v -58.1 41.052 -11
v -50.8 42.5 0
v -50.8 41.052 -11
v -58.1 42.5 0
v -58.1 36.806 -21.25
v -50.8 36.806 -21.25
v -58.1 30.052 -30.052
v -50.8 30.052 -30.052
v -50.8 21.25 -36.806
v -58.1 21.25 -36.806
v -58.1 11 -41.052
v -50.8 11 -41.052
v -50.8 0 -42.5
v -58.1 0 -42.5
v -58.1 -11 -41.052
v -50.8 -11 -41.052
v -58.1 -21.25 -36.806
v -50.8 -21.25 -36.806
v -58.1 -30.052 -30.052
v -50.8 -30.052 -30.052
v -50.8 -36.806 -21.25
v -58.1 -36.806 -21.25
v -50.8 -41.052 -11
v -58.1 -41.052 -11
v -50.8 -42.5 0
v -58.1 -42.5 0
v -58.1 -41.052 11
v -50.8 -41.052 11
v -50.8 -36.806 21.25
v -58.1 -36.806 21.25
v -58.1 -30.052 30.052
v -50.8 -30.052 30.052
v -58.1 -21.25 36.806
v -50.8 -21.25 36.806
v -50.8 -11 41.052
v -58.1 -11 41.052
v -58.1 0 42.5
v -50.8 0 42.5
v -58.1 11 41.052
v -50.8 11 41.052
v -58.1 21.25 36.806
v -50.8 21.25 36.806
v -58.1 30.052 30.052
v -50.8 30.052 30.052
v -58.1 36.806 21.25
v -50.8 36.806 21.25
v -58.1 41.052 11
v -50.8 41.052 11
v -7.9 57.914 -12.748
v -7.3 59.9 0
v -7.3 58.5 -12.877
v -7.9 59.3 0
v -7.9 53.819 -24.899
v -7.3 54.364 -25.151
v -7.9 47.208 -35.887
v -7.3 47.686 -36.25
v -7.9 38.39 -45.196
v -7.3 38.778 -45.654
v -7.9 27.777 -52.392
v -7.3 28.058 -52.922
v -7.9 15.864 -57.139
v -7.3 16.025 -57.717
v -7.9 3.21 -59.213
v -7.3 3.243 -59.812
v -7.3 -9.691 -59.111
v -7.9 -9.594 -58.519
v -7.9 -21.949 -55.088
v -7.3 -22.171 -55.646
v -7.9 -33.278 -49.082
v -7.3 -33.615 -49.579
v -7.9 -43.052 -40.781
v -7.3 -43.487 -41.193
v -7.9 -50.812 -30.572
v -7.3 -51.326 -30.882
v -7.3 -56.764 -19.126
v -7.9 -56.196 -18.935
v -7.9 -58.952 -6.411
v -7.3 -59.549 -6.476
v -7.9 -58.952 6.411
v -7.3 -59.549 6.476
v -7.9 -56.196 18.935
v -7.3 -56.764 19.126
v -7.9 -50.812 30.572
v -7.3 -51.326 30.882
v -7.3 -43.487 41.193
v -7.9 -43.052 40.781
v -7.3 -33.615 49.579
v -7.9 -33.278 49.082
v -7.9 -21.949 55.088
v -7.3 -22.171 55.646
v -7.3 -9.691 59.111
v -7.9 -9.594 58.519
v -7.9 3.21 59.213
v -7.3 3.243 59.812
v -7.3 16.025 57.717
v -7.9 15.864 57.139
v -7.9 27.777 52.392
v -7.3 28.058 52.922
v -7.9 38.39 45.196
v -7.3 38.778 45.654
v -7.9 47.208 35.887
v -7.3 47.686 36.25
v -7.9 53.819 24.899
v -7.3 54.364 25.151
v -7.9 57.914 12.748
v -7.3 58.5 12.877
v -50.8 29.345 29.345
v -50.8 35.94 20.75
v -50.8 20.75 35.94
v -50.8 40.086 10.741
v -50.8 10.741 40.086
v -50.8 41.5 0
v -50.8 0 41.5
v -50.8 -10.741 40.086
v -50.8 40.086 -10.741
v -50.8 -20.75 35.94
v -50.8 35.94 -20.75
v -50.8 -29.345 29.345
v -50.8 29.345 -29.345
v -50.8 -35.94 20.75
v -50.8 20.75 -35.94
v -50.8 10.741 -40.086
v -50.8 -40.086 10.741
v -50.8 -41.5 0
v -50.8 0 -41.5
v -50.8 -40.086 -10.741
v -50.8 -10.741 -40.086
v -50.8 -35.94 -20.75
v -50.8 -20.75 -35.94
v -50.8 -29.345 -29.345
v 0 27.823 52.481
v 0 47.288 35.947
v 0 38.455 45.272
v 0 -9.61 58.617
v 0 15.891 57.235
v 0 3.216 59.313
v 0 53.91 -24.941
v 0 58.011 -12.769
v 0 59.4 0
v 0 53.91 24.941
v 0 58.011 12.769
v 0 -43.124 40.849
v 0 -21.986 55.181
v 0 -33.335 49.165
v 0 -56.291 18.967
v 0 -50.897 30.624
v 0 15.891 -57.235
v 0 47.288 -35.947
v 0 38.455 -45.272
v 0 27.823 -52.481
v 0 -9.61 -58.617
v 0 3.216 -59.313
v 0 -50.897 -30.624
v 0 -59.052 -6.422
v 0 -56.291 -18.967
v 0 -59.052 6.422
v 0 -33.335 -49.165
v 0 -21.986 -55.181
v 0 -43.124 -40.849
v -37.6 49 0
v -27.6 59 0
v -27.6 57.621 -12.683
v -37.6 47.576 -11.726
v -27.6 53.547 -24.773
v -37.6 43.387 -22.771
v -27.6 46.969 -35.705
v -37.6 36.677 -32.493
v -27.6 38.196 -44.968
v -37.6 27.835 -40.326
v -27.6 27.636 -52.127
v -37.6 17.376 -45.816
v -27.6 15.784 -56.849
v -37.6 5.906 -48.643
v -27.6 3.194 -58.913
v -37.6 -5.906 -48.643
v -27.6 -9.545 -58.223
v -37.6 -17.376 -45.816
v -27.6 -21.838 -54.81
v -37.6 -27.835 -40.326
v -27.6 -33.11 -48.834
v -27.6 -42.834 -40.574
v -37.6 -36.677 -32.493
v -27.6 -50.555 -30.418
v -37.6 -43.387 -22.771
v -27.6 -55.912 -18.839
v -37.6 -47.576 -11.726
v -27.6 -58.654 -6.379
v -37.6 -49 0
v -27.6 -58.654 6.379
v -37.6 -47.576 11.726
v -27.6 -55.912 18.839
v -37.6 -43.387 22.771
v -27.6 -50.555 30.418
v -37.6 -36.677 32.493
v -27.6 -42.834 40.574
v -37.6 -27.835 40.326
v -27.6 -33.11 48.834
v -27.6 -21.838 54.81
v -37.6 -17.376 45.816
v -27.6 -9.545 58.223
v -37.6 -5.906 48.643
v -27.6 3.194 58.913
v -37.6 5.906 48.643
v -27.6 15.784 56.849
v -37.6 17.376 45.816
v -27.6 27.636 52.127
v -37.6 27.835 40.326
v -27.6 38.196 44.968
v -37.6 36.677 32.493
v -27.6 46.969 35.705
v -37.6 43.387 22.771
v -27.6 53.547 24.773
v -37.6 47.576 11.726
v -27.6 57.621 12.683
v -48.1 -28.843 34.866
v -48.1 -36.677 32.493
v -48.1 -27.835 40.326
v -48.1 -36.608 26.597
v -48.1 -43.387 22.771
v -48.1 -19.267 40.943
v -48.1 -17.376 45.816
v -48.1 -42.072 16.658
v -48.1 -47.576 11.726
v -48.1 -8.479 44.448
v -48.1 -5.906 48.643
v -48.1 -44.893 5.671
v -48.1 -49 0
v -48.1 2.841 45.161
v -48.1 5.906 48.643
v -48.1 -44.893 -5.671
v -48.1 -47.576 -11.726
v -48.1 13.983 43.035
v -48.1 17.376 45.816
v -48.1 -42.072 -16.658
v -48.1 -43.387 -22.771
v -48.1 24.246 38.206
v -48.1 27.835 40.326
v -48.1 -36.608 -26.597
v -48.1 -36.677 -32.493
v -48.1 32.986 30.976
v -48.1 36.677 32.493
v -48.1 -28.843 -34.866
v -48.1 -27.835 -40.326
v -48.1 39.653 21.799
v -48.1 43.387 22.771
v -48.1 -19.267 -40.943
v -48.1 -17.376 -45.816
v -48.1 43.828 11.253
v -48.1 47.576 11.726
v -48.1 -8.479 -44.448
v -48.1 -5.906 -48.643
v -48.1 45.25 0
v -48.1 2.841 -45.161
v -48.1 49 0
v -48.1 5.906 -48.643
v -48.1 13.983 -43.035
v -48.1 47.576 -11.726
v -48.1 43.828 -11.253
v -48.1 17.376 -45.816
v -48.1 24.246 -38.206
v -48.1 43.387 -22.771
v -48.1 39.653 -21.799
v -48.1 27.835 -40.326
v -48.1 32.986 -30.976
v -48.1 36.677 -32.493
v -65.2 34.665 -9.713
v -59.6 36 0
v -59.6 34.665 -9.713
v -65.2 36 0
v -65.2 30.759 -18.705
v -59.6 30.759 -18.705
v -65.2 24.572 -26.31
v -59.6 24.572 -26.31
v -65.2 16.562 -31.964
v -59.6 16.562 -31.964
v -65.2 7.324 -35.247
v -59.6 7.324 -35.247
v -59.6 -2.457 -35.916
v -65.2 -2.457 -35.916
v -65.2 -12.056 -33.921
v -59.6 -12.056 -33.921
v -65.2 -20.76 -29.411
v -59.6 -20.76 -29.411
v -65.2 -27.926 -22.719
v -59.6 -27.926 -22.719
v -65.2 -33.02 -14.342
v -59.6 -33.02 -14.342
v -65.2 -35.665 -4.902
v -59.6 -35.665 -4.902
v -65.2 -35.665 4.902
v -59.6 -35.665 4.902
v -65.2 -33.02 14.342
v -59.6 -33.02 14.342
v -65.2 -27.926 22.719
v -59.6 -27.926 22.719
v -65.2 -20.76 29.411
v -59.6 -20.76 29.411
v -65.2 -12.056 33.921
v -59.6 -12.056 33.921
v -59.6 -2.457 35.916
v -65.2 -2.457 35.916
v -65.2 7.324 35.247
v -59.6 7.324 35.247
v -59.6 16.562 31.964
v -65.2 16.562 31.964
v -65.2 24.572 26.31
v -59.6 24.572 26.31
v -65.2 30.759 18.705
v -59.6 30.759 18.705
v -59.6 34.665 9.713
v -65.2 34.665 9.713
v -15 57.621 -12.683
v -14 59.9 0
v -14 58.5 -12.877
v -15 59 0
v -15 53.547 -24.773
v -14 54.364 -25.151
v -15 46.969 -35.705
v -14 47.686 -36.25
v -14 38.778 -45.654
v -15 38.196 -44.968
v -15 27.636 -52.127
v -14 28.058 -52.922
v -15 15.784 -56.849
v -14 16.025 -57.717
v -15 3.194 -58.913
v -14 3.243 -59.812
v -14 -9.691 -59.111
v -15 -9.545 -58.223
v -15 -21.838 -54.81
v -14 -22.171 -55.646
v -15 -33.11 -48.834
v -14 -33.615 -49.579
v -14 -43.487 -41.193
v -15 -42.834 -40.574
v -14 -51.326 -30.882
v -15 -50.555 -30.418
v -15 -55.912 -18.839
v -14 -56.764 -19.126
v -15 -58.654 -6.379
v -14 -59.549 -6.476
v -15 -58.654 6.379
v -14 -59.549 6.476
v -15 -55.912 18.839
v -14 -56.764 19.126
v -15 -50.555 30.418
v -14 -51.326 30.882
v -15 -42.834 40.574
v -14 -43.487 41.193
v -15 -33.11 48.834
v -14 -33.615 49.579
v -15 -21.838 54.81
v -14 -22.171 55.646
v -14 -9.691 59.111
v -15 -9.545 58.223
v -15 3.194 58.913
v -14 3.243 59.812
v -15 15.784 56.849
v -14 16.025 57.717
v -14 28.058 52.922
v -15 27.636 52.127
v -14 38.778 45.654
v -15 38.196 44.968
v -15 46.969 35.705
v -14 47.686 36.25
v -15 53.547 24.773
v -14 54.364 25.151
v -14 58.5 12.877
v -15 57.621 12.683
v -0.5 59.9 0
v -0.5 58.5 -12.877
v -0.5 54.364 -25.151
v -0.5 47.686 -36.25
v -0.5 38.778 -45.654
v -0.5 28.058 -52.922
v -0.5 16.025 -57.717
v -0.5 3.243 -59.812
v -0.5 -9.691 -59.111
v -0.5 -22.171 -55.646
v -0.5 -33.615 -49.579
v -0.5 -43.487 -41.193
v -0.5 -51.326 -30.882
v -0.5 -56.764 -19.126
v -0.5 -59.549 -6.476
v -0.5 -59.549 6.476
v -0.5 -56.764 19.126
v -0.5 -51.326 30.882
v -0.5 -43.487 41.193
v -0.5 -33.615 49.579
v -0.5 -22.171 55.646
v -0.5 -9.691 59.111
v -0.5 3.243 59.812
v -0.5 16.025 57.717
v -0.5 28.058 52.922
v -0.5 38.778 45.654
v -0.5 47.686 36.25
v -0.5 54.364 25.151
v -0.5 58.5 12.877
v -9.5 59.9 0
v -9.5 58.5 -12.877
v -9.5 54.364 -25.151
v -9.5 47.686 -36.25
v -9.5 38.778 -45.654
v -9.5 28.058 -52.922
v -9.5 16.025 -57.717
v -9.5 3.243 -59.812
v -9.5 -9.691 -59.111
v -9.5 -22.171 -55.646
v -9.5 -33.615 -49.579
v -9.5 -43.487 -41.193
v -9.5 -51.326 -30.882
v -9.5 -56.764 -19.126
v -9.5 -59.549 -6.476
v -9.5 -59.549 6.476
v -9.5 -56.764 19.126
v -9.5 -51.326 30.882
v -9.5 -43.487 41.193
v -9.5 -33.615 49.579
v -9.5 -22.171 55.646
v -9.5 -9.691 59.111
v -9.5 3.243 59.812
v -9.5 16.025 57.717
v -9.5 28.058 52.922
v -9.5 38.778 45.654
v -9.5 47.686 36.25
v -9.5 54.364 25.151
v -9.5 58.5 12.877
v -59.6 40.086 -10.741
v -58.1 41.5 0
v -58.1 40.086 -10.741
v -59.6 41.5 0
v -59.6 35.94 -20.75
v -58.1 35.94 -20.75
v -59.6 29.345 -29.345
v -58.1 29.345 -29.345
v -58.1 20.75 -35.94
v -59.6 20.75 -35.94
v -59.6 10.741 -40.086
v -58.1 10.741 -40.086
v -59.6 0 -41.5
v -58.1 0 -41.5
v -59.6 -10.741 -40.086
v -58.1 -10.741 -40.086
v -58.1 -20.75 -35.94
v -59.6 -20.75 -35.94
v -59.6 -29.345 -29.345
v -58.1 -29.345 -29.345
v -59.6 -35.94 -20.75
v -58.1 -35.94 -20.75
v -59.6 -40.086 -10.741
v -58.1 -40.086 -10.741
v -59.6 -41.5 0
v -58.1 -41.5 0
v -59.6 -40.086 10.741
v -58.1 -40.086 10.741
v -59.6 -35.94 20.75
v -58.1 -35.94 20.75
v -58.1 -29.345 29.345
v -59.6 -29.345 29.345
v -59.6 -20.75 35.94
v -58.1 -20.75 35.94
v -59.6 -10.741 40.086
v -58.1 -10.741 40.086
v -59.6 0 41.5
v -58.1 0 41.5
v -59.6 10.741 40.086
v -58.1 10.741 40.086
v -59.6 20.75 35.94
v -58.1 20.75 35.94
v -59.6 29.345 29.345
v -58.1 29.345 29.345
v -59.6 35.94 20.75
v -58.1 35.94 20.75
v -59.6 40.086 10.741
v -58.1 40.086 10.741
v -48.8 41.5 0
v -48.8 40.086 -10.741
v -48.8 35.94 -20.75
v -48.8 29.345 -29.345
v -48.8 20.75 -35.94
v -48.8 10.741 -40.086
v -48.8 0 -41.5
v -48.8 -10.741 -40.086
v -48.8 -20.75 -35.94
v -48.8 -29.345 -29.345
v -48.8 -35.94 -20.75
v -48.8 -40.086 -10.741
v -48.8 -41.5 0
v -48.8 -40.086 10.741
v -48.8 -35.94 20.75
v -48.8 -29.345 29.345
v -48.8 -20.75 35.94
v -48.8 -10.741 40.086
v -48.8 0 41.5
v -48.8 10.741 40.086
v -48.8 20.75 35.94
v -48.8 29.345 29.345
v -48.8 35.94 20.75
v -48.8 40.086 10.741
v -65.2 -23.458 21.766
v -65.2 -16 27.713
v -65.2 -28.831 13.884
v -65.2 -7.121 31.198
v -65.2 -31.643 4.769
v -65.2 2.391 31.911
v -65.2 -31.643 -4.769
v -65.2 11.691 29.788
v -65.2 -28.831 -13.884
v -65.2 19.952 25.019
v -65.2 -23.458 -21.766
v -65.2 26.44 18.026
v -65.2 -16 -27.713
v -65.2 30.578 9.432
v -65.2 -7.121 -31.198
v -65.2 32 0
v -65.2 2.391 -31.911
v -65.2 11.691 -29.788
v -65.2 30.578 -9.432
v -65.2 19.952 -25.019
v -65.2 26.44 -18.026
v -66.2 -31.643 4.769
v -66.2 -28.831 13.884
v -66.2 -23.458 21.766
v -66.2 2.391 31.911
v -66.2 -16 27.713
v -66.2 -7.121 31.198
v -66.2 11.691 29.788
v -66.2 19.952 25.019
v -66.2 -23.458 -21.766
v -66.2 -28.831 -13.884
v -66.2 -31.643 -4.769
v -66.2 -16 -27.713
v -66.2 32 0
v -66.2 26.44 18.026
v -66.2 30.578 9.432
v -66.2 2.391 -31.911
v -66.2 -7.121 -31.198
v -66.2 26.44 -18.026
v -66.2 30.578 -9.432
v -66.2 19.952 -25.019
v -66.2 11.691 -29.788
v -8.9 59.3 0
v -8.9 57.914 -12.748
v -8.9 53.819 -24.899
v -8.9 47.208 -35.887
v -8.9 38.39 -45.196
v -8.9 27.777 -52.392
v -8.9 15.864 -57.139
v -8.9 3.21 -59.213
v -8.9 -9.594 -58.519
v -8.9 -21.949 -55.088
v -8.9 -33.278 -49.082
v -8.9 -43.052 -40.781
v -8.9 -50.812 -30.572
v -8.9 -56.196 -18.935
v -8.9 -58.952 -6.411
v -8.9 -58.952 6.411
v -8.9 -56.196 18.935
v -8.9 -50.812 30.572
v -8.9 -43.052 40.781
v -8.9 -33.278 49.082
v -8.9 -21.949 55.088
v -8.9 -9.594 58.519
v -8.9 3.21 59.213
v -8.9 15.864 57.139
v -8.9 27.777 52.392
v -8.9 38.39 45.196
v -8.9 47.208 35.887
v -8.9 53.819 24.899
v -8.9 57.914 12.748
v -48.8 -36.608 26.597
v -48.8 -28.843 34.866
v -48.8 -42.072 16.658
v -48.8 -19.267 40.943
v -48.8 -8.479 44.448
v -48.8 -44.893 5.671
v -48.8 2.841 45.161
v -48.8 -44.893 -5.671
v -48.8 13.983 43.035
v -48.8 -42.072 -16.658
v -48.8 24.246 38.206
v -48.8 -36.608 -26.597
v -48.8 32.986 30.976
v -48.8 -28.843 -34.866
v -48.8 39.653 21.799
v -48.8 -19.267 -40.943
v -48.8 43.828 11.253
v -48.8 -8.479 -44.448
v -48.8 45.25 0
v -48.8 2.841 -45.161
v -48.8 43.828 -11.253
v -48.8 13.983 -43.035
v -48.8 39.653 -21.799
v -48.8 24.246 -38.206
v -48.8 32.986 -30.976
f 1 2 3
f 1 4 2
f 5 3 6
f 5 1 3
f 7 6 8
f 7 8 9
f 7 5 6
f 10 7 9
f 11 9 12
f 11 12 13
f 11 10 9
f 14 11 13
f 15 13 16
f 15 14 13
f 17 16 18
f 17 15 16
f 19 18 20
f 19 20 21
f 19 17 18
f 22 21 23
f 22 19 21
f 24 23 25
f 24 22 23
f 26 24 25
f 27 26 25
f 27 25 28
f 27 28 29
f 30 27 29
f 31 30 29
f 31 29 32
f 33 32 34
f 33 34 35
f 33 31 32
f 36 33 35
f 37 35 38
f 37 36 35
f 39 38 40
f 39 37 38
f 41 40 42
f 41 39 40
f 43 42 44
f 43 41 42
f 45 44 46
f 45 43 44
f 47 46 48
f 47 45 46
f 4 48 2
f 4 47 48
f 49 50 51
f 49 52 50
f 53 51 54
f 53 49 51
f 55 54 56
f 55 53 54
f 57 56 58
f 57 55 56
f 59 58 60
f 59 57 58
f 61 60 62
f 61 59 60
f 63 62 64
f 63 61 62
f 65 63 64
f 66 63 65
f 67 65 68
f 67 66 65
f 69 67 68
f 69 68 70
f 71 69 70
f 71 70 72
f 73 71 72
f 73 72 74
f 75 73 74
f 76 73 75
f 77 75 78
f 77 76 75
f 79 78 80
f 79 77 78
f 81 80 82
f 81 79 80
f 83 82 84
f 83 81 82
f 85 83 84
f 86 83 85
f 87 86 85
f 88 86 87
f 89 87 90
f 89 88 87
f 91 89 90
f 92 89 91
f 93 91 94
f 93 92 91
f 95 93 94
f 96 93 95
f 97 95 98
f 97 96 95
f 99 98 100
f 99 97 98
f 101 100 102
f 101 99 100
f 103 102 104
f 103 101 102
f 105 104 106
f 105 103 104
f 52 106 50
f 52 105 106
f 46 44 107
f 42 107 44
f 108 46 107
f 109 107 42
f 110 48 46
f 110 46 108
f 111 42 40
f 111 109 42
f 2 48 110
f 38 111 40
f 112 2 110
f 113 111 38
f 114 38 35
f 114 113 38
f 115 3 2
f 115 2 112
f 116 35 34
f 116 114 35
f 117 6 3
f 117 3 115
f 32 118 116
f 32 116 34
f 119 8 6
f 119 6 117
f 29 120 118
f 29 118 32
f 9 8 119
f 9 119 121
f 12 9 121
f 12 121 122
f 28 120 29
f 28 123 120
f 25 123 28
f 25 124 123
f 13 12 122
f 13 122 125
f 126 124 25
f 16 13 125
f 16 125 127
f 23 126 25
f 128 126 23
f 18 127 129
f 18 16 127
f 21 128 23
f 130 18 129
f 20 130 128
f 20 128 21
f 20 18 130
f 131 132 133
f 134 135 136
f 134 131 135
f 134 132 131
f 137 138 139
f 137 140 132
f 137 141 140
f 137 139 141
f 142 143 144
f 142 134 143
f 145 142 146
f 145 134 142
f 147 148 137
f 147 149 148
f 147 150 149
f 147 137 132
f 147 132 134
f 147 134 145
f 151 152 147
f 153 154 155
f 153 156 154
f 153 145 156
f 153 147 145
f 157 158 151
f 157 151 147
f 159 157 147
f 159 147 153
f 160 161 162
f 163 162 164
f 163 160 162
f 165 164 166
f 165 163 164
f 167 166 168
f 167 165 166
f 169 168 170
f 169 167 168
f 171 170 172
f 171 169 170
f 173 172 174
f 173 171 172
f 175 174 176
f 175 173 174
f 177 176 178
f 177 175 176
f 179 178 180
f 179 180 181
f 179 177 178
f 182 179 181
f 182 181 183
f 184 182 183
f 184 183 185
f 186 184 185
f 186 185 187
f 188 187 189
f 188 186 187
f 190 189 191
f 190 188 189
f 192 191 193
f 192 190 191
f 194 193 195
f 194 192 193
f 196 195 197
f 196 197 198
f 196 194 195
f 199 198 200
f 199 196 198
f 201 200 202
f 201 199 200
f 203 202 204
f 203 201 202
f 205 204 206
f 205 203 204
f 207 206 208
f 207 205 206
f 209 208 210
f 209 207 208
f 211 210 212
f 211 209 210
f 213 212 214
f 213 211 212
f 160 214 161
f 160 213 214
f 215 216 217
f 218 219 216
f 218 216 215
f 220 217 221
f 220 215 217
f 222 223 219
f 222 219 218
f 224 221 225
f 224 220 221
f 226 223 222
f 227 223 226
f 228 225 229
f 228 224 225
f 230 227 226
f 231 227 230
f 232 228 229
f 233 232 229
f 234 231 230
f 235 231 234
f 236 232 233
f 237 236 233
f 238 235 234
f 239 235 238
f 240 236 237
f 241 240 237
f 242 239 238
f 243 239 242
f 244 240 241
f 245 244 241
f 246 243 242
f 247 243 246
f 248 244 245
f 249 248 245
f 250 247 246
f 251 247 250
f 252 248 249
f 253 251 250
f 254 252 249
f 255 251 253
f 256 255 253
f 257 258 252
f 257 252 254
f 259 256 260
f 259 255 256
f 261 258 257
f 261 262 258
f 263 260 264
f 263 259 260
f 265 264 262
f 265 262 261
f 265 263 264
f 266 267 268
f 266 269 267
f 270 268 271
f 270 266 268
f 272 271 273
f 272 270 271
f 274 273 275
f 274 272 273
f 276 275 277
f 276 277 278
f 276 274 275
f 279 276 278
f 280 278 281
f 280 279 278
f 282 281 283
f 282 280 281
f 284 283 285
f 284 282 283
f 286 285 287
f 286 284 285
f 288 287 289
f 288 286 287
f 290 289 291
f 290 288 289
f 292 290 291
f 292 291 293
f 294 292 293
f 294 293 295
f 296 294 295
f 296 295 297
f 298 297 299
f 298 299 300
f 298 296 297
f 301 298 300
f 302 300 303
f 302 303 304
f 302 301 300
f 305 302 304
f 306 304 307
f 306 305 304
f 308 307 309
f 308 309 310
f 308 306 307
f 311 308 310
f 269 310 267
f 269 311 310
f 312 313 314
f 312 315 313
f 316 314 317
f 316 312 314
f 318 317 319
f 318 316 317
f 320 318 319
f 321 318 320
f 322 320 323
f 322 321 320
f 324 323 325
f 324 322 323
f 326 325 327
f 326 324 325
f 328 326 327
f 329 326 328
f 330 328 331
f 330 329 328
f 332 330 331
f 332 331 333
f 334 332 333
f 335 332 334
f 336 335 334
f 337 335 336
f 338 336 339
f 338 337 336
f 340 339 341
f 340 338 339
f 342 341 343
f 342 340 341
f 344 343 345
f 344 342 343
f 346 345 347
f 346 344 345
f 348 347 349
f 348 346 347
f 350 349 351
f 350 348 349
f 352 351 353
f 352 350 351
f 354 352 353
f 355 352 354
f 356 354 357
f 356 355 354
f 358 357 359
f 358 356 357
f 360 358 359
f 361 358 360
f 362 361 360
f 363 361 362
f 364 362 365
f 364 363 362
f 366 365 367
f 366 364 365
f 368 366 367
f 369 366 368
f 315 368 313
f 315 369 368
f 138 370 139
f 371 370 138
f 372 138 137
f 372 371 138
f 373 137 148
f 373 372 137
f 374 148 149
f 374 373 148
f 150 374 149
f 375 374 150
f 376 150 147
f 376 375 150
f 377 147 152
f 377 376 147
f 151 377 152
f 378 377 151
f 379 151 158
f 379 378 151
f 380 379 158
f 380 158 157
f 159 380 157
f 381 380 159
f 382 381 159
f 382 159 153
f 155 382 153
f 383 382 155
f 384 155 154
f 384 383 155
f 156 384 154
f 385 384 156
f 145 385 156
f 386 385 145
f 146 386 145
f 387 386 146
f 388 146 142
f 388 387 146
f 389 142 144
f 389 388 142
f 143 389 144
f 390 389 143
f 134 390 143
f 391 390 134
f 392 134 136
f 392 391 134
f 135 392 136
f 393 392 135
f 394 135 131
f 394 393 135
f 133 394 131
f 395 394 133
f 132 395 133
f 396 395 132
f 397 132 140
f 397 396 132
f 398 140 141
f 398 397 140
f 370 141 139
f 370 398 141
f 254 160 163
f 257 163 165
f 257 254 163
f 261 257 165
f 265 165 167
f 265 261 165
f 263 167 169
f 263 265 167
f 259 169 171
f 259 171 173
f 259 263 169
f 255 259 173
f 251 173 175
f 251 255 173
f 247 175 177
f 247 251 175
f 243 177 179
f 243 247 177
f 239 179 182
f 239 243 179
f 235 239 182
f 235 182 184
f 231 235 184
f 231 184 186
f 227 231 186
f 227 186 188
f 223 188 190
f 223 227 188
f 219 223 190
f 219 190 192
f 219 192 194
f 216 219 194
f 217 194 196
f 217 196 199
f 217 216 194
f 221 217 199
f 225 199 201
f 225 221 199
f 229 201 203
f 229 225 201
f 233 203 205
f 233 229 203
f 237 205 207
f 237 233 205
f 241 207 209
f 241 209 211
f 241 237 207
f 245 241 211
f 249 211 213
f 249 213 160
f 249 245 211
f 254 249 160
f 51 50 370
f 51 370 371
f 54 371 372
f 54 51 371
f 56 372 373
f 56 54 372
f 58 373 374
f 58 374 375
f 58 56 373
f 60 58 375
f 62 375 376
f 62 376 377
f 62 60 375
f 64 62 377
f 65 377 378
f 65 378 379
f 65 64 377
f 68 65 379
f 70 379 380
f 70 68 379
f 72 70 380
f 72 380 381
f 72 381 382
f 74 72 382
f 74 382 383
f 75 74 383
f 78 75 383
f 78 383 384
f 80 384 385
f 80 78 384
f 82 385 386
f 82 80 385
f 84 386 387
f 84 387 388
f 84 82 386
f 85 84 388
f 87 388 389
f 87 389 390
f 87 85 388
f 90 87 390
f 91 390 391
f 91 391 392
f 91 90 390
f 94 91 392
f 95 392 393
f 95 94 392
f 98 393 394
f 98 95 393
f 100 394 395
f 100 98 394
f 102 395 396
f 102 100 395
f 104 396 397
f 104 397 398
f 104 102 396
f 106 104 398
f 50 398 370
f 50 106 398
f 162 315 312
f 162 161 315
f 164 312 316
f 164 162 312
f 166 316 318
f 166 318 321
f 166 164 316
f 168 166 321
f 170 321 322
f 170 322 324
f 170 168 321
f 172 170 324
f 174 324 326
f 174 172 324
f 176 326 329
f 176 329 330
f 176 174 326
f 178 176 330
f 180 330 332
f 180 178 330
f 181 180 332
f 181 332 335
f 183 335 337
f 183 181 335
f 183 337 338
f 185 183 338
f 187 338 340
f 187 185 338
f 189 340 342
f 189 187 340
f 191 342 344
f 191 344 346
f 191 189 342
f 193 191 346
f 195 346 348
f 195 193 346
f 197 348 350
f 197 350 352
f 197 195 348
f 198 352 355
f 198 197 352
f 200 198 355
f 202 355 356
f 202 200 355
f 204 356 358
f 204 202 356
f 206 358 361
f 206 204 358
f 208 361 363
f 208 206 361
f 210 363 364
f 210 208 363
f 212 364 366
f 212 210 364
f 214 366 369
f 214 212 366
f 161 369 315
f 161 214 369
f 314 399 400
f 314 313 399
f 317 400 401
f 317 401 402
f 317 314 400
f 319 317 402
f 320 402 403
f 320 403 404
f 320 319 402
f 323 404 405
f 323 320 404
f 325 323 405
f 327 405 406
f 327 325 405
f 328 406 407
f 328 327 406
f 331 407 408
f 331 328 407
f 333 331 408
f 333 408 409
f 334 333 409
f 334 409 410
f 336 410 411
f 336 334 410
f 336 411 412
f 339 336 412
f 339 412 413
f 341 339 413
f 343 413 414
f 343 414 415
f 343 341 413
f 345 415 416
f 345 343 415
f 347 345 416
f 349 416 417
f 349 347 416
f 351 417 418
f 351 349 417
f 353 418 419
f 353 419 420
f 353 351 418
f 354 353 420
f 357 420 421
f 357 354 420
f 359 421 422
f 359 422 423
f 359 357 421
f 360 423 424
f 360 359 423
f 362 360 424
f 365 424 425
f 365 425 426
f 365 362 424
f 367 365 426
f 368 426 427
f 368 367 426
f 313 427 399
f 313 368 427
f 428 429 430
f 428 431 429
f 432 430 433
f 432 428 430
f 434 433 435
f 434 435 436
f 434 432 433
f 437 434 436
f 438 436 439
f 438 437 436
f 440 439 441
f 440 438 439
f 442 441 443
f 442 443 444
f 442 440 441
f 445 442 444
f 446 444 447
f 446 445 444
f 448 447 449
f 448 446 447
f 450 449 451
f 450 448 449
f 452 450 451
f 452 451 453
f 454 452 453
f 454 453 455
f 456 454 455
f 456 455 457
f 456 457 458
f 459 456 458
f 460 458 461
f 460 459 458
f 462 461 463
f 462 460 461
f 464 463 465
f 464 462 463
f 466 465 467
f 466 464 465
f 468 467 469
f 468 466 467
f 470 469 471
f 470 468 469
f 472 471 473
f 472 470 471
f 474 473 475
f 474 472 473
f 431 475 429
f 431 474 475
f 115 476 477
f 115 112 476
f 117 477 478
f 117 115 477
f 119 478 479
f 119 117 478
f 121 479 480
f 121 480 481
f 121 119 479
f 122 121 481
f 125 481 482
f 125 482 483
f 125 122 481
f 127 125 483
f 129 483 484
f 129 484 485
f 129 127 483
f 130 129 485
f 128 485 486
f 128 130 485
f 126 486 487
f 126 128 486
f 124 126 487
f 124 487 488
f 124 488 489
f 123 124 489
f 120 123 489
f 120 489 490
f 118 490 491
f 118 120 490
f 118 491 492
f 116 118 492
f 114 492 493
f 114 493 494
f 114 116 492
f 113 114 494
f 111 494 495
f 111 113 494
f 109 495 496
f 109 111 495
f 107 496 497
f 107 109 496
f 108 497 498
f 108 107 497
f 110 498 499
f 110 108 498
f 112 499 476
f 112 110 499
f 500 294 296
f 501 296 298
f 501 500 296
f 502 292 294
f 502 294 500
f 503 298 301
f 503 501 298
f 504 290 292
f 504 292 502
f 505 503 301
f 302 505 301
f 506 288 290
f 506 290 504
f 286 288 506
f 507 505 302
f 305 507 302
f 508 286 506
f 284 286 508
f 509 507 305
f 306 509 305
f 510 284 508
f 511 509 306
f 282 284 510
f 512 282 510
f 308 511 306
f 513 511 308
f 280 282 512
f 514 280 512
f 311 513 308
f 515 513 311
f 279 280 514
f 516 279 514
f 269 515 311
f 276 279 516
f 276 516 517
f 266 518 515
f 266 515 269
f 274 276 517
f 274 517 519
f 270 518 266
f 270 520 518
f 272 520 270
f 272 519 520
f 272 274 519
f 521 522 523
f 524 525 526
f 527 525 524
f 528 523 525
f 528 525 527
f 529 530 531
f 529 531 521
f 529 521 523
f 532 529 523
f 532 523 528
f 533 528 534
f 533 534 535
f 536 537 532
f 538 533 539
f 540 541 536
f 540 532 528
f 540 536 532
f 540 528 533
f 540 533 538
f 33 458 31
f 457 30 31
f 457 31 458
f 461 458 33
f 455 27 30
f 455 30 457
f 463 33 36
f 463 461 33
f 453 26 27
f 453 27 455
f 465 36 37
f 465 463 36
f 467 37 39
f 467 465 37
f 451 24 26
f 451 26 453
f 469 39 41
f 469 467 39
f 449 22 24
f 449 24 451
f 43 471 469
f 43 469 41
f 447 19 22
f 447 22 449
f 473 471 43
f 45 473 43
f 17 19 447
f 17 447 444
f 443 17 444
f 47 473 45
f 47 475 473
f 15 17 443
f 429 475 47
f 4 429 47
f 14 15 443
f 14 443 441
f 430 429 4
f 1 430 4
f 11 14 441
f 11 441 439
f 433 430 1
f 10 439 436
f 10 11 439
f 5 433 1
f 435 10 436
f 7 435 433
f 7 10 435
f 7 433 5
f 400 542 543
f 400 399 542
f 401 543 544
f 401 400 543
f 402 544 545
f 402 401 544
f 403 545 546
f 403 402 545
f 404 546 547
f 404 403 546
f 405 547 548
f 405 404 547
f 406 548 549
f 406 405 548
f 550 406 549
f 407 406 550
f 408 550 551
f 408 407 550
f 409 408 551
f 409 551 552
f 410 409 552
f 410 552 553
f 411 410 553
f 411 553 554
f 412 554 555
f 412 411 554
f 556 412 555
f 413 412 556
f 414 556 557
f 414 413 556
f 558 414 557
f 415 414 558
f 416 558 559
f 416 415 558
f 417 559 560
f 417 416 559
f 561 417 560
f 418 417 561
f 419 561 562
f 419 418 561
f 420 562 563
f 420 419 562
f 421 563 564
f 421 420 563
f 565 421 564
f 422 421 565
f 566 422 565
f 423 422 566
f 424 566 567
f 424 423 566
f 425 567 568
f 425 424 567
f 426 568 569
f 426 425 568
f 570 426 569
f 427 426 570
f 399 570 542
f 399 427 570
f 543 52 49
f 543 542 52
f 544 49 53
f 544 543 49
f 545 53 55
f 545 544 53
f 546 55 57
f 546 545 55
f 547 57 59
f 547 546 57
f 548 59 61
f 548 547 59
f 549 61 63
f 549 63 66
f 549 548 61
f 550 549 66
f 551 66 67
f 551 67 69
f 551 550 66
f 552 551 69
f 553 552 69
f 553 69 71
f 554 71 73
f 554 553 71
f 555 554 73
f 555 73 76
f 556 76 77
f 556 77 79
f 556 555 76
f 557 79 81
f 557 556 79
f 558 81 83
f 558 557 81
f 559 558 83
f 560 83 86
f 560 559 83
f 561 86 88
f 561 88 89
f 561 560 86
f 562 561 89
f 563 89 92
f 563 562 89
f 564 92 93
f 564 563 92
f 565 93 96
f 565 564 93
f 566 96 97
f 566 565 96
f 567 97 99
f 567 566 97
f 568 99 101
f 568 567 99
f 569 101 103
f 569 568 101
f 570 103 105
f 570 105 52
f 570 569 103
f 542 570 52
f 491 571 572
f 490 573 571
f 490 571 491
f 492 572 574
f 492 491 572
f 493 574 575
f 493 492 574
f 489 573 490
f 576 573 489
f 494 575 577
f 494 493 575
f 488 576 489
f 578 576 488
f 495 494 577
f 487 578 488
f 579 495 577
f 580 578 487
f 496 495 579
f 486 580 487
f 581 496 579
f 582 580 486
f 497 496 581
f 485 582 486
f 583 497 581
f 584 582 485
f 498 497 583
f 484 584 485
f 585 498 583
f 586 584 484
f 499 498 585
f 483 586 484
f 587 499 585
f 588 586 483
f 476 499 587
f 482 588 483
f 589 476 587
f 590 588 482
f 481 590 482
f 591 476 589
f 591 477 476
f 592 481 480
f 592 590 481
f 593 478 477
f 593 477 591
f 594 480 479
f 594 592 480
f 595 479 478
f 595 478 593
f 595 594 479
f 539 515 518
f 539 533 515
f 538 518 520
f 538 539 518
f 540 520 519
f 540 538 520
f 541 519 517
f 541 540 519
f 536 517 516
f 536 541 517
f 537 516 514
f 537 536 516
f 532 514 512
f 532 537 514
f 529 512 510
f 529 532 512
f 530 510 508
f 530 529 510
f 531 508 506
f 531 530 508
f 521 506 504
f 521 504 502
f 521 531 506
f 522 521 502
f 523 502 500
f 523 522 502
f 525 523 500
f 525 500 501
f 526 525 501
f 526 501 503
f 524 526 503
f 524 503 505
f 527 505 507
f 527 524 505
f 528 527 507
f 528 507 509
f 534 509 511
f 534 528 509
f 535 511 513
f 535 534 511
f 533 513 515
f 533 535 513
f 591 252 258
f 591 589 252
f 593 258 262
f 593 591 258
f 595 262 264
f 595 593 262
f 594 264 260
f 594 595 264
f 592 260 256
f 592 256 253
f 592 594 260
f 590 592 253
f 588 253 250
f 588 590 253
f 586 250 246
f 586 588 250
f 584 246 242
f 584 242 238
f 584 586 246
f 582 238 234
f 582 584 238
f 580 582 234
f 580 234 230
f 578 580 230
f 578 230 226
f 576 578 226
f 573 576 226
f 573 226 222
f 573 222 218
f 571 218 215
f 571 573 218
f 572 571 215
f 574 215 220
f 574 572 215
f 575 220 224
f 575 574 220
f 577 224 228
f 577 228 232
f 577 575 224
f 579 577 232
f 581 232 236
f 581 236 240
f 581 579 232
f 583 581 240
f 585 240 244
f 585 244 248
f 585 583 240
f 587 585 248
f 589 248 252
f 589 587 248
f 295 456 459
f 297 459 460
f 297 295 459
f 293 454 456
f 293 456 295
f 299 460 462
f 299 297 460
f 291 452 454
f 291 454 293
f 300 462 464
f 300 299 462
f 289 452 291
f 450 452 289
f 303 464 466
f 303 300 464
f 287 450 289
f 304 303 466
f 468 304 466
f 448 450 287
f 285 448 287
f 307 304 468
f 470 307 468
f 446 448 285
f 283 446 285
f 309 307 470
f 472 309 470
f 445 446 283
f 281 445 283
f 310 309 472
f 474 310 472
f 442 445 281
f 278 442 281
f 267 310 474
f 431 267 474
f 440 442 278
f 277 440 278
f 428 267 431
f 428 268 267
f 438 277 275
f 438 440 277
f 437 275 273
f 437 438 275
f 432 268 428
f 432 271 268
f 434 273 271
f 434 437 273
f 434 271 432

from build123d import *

# Parameters (mm, degrees)
CHAMFER1_SIZE = 0.5


with BuildPart() as part:
    # Sketch1 → Revolve1 (revolve)
    with BuildSketch(Plane.XY):
        Polygon((0, 0), (0, 59.9), (-7.3, 59.9), (-7.9, 59.3), (-8.9, 59.3), (-9.5, 59.9), (-14, 59.9), (-15, 59), (-27.6, 59), (-37.6, 49), (-48.1, 49), (-48.1, 45.25), (-48.8, 45.25), (-48.8, 41.5), (-50.8, 41.5), (-50.8, 42.5), (-58.1, 42.5), (-58.1, 41.5), (-59.6, 41.5), (-59.6, 36), (-65.2, 36), (-65.2, 32), (-66.2, 32), (-66.2, 0), align=None)
    revolve(axis=Axis((0, 0, 0), (-1, 0, 0)))

    # Chamfer1
    chamfer1_edges = [part.edges().sort_by_distance(p)[0] for p in [
        (0, -59.9, 0),
    ]]
    chamfer(chamfer1_edges, length=CHAMFER1_SIZE)


solid = part.part
